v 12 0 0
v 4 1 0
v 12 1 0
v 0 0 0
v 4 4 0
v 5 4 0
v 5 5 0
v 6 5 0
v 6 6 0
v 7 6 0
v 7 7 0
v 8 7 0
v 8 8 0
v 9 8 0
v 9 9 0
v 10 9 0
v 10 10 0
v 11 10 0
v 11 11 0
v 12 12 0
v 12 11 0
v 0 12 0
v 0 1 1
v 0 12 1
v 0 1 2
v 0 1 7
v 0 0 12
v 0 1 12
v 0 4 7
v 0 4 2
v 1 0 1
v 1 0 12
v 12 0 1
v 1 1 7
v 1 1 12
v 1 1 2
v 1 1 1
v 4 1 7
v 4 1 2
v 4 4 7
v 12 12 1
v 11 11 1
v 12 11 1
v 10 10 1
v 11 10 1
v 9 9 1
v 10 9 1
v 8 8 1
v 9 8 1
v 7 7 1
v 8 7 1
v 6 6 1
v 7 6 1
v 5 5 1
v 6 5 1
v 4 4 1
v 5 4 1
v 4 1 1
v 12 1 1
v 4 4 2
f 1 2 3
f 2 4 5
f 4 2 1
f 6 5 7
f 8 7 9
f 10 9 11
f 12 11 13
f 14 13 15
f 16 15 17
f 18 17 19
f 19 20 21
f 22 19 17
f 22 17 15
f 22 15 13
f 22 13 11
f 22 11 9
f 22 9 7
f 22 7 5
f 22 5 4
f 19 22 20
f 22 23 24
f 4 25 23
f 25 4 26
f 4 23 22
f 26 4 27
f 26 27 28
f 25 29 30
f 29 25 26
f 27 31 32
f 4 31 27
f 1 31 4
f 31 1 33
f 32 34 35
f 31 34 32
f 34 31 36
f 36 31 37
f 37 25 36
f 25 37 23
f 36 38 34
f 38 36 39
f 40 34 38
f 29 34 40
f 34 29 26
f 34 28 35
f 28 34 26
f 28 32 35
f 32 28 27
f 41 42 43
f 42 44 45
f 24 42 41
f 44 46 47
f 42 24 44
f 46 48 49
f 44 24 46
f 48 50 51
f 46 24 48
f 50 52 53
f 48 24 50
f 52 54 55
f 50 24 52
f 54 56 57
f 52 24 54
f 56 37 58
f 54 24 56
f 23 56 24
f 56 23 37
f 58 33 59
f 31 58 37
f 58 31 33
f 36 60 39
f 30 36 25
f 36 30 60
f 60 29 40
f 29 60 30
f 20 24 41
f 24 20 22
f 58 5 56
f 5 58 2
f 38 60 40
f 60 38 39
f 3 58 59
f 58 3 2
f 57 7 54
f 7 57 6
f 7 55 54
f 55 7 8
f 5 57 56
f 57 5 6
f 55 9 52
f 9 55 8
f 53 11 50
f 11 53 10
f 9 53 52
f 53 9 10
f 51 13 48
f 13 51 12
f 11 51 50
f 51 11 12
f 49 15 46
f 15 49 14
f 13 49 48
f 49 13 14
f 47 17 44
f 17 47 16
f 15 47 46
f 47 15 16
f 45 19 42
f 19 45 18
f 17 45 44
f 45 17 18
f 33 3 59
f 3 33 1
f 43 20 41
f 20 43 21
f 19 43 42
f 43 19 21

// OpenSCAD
union() {
    translate([0.0, 0.0, 0.0]) cube([1, 1, 1]);
    translate([0.0, 0.0, 1.0]) cube([1, 1, 1]);
    translate([0.0, 0.0, 2.0]) cube([1, 1, 1]);
    translate([0.0, 0.0, 3.0]) cube([1, 1, 1]);
    translate([0.0, 0.0, 4.0]) cube([1, 1, 1]);
    translate([0.0, 0.0, 5.0]) cube([1, 1, 1]);
    translate([0.0, 0.0, 6.0]) cube([1, 1, 1]);
    translate([0.0, 0.0, 7.0]) cube([1, 1, 1]);
    translate([0.0, 0.0, 8.0]) cube([1, 1, 1]);
    translate([0.0, 0.0, 9.0]) cube([1, 1, 1]);
    translate([0.0, 0.0, 10.0]) cube([1, 1, 1]);
    translate([0.0, 0.0, 11.0]) cube([1, 1, 1]);
    translate([0.0, 1.0, 0.0]) cube([1, 1, 1]);
    translate([0.0, 1.0, 2.0]) cube([1, 1, 1]);
    translate([0.0, 1.0, 3.0]) cube([1, 1, 1]);
    translate([0.0, 1.0, 4.0]) cube([1, 1, 1]);
    translate([0.0, 1.0, 5.0]) cube([1, 1, 1]);
    translate([0.0, 1.0, 6.0]) cube([1, 1, 1]);
    translate([0.0, 2.0, 0.0]) cube([1, 1, 1]);
    translate([0.0, 2.0, 2.0]) cube([1, 1, 1]);
    translate([0.0, 2.0, 3.0]) cube([1, 1, 1]);
    translate([0.0, 2.0, 4.0]) cube([1, 1, 1]);
    translate([0.0, 2.0, 5.0]) cube([1, 1, 1]);
    translate([0.0, 2.0, 6.0]) cube([1, 1, 1]);
    translate([0.0, 3.0, 0.0]) cube([1, 1, 1]);
    translate([0.0, 3.0, 2.0]) cube([1, 1, 1]);
    translate([0.0, 3.0, 3.0]) cube([1, 1, 1]);
    translate([0.0, 3.0, 4.0]) cube([1, 1, 1]);
    translate([0.0, 3.0, 5.0]) cube([1, 1, 1]);
    translate([0.0, 3.0, 6.0]) cube([1, 1, 1]);
    translate([0.0, 4.0, 0.0]) cube([1, 1, 1]);
    translate([0.0, 5.0, 0.0]) cube([1, 1, 1]);
    translate([0.0, 6.0, 0.0]) cube([1, 1, 1]);
    translate([0.0, 7.0, 0.0]) cube([1, 1, 1]);
    translate([0.0, 8.0, 0.0]) cube([1, 1, 1]);
    translate([0.0, 9.0, 0.0]) cube([1, 1, 1]);
    translate([0.0, 10.0, 0.0]) cube([1, 1, 1]);
    translate([0.0, 11.0, 0.0]) cube([1, 1, 1]);
    translate([1.0, 0.0, 0.0]) cube([1, 1, 1]);
    translate([1.0, 1.0, 0.0]) cube([1, 1, 1]);
    translate([1.0, 1.0, 2.0]) cube([1, 1, 1]);
    translate([1.0, 1.0, 3.0]) cube([1, 1, 1]);
    translate([1.0, 1.0, 4.0]) cube([1, 1, 1]);
    translate([1.0, 1.0, 5.0]) cube([1, 1, 1]);
    translate([1.0, 1.0, 6.0]) cube([1, 1, 1]);
    translate([1.0, 2.0, 0.0]) cube([1, 1, 1]);
    translate([1.0, 2.0, 2.0]) cube([1, 1, 1]);
    translate([1.0, 2.0, 3.0]) cube([1, 1, 1]);
    translate([1.0, 2.0, 4.0]) cube([1, 1, 1]);
    translate([1.0, 2.0, 5.0]) cube([1, 1, 1]);
    translate([1.0, 2.0, 6.0]) cube([1, 1, 1]);
    translate([1.0, 3.0, 0.0]) cube([1, 1, 1]);
    translate([1.0, 3.0, 2.0]) cube([1, 1, 1]);
    translate([1.0, 3.0, 3.0]) cube([1, 1, 1]);
    translate([1.0, 3.0, 4.0]) cube([1, 1, 1]);
    translate([1.0, 3.0, 5.0]) cube([1, 1, 1]);
    translate([1.0, 3.0, 6.0]) cube([1, 1, 1]);
    translate([1.0, 4.0, 0.0]) cube([1, 1, 1]);
    translate([1.0, 5.0, 0.0]) cube([1, 1, 1]);
    translate([1.0, 6.0, 0.0]) cube([1, 1, 1]);
    translate([1.0, 7.0, 0.0]) cube([1, 1, 1]);
    translate([1.0, 8.0, 0.0]) cube([1, 1, 1]);
    translate([1.0, 9.0, 0.0]) cube([1, 1, 1]);
    translate([1.0, 10.0, 0.0]) cube([1, 1, 1]);
    translate([1.0, 11.0, 0.0]) cube([1, 1, 1]);
    translate([2.0, 0.0, 0.0]) cube([1, 1, 1]);
    translate([2.0, 1.0, 0.0]) cube([1, 1, 1]);
    translate([2.0, 1.0, 2.0]) cube([1, 1, 1]);
    translate([2.0, 1.0, 3.0]) cube([1, 1, 1]);
    translate([2.0, 1.0, 4.0]) cube([1, 1, 1]);
    translate([2.0, 1.0, 5.0]) cube([1, 1, 1]);
    translate([2.0, 1.0, 6.0]) cube([1, 1, 1]);
    translate([2.0, 2.0, 0.0]) cube([1, 1, 1]);
    translate([2.0, 2.0, 2.0]) cube([1, 1, 1]);
    translate([2.0, 2.0, 3.0]) cube([1, 1, 1]);
    translate([2.0, 2.0, 4.0]) cube([1, 1, 1]);
    translate([2.0, 2.0, 5.0]) cube([1, 1, 1]);
    translate([2.0, 2.0, 6.0]) cube([1, 1, 1]);
    translate([2.0, 3.0, 0.0]) cube([1, 1, 1]);
    translate([2.0, 3.0, 2.0]) cube([1, 1, 1]);
    translate([2.0, 3.0, 3.0]) cube([1, 1, 1]);
    translate([2.0, 3.0, 4.0]) cube([1, 1, 1]);
    translate([2.0, 3.0, 5.0]) cube([1, 1, 1]);
    translate([2.0, 3.0, 6.0]) cube([1, 1, 1]);
    translate([2.0, 4.0, 0.0]) cube([1, 1, 1]);
    translate([2.0, 5.0, 0.0]) cube([1, 1, 1]);
    translate([2.0, 6.0, 0.0]) cube([1, 1, 1]);
    translate([2.0, 7.0, 0.0]) cube([1, 1, 1]);
    translate([2.0, 8.0, 0.0]) cube([1, 1, 1]);
    translate([2.0, 9.0, 0.0]) cube([1, 1, 1]);
    translate([2.0, 10.0, 0.0]) cube([1, 1, 1]);
    translate([2.0, 11.0, 0.0]) cube([1, 1, 1]);
    translate([3.0, 0.0, 0.0]) cube([1, 1, 1]);
    translate([3.0, 1.0, 0.0]) cube([1, 1, 1]);
    translate([3.0, 1.0, 2.0]) cube([1, 1, 1]);
    translate([3.0, 1.0, 3.0]) cube([1, 1, 1]);
    translate([3.0, 1.0, 4.0]) cube([1, 1, 1]);
    translate([3.0, 1.0, 5.0]) cube([1, 1, 1]);
    translate([3.0, 1.0, 6.0]) cube([1, 1, 1]);
    translate([3.0, 2.0, 0.0]) cube([1, 1, 1]);
    translate([3.0, 2.0, 2.0]) cube([1, 1, 1]);
    translate([3.0, 2.0, 3.0]) cube([1, 1, 1]);
    translate([3.0, 2.0, 4.0]) cube([1, 1, 1]);
    translate([3.0, 2.0, 5.0]) cube([1, 1, 1]);
    translate([3.0, 2.0, 6.0]) cube([1, 1, 1]);
    translate([3.0, 3.0, 0.0]) cube([1, 1, 1]);
    translate([3.0, 3.0, 2.0]) cube([1, 1, 1]);
    translate([3.0, 3.0, 3.0]) cube([1, 1, 1]);
    translate([3.0, 3.0, 4.0]) cube([1, 1, 1]);
    translate([3.0, 3.0, 5.0]) cube([1, 1, 1]);
    translate([3.0, 3.0, 6.0]) cube([1, 1, 1]);
    translate([3.0, 4.0, 0.0]) cube([1, 1, 1]);
    translate([3.0, 5.0, 0.0]) cube([1, 1, 1]);
    translate([3.0, 6.0, 0.0]) cube([1, 1, 1]);
    translate([3.0, 7.0, 0.0]) cube([1, 1, 1]);
    translate([3.0, 8.0, 0.0]) cube([1, 1, 1]);
    translate([3.0, 9.0, 0.0]) cube([1, 1, 1]);
    translate([3.0, 10.0, 0.0]) cube([1, 1, 1]);
    translate([3.0, 11.0, 0.0]) cube([1, 1, 1]);
    translate([4.0, 0.0, 0.0]) cube([1, 1, 1]);
    translate([4.0, 4.0, 0.0]) cube([1, 1, 1]);
    translate([4.0, 5.0, 0.0]) cube([1, 1, 1]);
    translate([4.0, 6.0, 0.0]) cube([1, 1, 1]);
    translate([4.0, 7.0, 0.0]) cube([1, 1, 1]);
    translate([4.0, 8.0, 0.0]) cube([1, 1, 1]);
    translate([4.0, 9.0, 0.0]) cube([1, 1, 1]);
    translate([4.0, 10.0, 0.0]) cube([1, 1, 1]);
    translate([4.0, 11.0, 0.0]) cube([1, 1, 1]);
    translate([5.0, 0.0, 0.0]) cube([1, 1, 1]);
    translate([5.0, 5.0, 0.0]) cube([1, 1, 1]);
    translate([5.0, 6.0, 0.0]) cube([1, 1, 1]);
    translate([5.0, 7.0, 0.0]) cube([1, 1, 1]);
    translate([5.0, 8.0, 0.0]) cube([1, 1, 1]);
    translate([5.0, 9.0, 0.0]) cube([1, 1, 1]);
    translate([5.0, 10.0, 0.0]) cube([1, 1, 1]);
    translate([5.0, 11.0, 0.0]) cube([1, 1, 1]);
    translate([6.0, 0.0, 0.0]) cube([1, 1, 1]);
    translate([6.0, 6.0, 0.0]) cube([1, 1, 1]);
    translate([6.0, 7.0, 0.0]) cube([1, 1, 1]);
    translate([6.0, 8.0, 0.0]) cube([1, 1, 1]);
    translate([6.0, 9.0, 0.0]) cube([1, 1, 1]);
    translate([6.0, 10.0, 0.0]) cube([1, 1, 1]);
    translate([6.0, 11.0, 0.0]) cube([1, 1, 1]);
    translate([7.0, 0.0, 0.0]) cube([1, 1, 1]);
    translate([7.0, 7.0, 0.0]) cube([1, 1, 1]);
    translate([7.0, 8.0, 0.0]) cube([1, 1, 1]);
    translate([7.0, 9.0, 0.0]) cube([1, 1, 1]);
    translate([7.0, 10.0, 0.0]) cube([1, 1, 1]);
    translate([7.0, 11.0, 0.0]) cube([1, 1, 1]);
    translate([8.0, 0.0, 0.0]) cube([1, 1, 1]);
    translate([8.0, 8.0, 0.0]) cube([1, 1, 1]);
    translate([8.0, 9.0, 0.0]) cube([1, 1, 1]);
    translate([8.0, 10.0, 0.0]) cube([1, 1, 1]);
    translate([8.0, 11.0, 0.0]) cube([1, 1, 1]);
    translate([9.0, 0.0, 0.0]) cube([1, 1, 1]);
    translate([9.0, 9.0, 0.0]) cube([1, 1, 1]);
    translate([9.0, 10.0, 0.0]) cube([1, 1, 1]);
    translate([9.0, 11.0, 0.0]) cube([1, 1, 1]);
    translate([10.0, 0.0, 0.0]) cube([1, 1, 1]);
    translate([10.0, 10.0, 0.0]) cube([1, 1, 1]);
    translate([10.0, 11.0, 0.0]) cube([1, 1, 1]);
    translate([11.0, 0.0, 0.0]) cube([1, 1, 1]);
    translate([11.0, 11.0, 0.0]) cube([1, 1, 1]);
}
